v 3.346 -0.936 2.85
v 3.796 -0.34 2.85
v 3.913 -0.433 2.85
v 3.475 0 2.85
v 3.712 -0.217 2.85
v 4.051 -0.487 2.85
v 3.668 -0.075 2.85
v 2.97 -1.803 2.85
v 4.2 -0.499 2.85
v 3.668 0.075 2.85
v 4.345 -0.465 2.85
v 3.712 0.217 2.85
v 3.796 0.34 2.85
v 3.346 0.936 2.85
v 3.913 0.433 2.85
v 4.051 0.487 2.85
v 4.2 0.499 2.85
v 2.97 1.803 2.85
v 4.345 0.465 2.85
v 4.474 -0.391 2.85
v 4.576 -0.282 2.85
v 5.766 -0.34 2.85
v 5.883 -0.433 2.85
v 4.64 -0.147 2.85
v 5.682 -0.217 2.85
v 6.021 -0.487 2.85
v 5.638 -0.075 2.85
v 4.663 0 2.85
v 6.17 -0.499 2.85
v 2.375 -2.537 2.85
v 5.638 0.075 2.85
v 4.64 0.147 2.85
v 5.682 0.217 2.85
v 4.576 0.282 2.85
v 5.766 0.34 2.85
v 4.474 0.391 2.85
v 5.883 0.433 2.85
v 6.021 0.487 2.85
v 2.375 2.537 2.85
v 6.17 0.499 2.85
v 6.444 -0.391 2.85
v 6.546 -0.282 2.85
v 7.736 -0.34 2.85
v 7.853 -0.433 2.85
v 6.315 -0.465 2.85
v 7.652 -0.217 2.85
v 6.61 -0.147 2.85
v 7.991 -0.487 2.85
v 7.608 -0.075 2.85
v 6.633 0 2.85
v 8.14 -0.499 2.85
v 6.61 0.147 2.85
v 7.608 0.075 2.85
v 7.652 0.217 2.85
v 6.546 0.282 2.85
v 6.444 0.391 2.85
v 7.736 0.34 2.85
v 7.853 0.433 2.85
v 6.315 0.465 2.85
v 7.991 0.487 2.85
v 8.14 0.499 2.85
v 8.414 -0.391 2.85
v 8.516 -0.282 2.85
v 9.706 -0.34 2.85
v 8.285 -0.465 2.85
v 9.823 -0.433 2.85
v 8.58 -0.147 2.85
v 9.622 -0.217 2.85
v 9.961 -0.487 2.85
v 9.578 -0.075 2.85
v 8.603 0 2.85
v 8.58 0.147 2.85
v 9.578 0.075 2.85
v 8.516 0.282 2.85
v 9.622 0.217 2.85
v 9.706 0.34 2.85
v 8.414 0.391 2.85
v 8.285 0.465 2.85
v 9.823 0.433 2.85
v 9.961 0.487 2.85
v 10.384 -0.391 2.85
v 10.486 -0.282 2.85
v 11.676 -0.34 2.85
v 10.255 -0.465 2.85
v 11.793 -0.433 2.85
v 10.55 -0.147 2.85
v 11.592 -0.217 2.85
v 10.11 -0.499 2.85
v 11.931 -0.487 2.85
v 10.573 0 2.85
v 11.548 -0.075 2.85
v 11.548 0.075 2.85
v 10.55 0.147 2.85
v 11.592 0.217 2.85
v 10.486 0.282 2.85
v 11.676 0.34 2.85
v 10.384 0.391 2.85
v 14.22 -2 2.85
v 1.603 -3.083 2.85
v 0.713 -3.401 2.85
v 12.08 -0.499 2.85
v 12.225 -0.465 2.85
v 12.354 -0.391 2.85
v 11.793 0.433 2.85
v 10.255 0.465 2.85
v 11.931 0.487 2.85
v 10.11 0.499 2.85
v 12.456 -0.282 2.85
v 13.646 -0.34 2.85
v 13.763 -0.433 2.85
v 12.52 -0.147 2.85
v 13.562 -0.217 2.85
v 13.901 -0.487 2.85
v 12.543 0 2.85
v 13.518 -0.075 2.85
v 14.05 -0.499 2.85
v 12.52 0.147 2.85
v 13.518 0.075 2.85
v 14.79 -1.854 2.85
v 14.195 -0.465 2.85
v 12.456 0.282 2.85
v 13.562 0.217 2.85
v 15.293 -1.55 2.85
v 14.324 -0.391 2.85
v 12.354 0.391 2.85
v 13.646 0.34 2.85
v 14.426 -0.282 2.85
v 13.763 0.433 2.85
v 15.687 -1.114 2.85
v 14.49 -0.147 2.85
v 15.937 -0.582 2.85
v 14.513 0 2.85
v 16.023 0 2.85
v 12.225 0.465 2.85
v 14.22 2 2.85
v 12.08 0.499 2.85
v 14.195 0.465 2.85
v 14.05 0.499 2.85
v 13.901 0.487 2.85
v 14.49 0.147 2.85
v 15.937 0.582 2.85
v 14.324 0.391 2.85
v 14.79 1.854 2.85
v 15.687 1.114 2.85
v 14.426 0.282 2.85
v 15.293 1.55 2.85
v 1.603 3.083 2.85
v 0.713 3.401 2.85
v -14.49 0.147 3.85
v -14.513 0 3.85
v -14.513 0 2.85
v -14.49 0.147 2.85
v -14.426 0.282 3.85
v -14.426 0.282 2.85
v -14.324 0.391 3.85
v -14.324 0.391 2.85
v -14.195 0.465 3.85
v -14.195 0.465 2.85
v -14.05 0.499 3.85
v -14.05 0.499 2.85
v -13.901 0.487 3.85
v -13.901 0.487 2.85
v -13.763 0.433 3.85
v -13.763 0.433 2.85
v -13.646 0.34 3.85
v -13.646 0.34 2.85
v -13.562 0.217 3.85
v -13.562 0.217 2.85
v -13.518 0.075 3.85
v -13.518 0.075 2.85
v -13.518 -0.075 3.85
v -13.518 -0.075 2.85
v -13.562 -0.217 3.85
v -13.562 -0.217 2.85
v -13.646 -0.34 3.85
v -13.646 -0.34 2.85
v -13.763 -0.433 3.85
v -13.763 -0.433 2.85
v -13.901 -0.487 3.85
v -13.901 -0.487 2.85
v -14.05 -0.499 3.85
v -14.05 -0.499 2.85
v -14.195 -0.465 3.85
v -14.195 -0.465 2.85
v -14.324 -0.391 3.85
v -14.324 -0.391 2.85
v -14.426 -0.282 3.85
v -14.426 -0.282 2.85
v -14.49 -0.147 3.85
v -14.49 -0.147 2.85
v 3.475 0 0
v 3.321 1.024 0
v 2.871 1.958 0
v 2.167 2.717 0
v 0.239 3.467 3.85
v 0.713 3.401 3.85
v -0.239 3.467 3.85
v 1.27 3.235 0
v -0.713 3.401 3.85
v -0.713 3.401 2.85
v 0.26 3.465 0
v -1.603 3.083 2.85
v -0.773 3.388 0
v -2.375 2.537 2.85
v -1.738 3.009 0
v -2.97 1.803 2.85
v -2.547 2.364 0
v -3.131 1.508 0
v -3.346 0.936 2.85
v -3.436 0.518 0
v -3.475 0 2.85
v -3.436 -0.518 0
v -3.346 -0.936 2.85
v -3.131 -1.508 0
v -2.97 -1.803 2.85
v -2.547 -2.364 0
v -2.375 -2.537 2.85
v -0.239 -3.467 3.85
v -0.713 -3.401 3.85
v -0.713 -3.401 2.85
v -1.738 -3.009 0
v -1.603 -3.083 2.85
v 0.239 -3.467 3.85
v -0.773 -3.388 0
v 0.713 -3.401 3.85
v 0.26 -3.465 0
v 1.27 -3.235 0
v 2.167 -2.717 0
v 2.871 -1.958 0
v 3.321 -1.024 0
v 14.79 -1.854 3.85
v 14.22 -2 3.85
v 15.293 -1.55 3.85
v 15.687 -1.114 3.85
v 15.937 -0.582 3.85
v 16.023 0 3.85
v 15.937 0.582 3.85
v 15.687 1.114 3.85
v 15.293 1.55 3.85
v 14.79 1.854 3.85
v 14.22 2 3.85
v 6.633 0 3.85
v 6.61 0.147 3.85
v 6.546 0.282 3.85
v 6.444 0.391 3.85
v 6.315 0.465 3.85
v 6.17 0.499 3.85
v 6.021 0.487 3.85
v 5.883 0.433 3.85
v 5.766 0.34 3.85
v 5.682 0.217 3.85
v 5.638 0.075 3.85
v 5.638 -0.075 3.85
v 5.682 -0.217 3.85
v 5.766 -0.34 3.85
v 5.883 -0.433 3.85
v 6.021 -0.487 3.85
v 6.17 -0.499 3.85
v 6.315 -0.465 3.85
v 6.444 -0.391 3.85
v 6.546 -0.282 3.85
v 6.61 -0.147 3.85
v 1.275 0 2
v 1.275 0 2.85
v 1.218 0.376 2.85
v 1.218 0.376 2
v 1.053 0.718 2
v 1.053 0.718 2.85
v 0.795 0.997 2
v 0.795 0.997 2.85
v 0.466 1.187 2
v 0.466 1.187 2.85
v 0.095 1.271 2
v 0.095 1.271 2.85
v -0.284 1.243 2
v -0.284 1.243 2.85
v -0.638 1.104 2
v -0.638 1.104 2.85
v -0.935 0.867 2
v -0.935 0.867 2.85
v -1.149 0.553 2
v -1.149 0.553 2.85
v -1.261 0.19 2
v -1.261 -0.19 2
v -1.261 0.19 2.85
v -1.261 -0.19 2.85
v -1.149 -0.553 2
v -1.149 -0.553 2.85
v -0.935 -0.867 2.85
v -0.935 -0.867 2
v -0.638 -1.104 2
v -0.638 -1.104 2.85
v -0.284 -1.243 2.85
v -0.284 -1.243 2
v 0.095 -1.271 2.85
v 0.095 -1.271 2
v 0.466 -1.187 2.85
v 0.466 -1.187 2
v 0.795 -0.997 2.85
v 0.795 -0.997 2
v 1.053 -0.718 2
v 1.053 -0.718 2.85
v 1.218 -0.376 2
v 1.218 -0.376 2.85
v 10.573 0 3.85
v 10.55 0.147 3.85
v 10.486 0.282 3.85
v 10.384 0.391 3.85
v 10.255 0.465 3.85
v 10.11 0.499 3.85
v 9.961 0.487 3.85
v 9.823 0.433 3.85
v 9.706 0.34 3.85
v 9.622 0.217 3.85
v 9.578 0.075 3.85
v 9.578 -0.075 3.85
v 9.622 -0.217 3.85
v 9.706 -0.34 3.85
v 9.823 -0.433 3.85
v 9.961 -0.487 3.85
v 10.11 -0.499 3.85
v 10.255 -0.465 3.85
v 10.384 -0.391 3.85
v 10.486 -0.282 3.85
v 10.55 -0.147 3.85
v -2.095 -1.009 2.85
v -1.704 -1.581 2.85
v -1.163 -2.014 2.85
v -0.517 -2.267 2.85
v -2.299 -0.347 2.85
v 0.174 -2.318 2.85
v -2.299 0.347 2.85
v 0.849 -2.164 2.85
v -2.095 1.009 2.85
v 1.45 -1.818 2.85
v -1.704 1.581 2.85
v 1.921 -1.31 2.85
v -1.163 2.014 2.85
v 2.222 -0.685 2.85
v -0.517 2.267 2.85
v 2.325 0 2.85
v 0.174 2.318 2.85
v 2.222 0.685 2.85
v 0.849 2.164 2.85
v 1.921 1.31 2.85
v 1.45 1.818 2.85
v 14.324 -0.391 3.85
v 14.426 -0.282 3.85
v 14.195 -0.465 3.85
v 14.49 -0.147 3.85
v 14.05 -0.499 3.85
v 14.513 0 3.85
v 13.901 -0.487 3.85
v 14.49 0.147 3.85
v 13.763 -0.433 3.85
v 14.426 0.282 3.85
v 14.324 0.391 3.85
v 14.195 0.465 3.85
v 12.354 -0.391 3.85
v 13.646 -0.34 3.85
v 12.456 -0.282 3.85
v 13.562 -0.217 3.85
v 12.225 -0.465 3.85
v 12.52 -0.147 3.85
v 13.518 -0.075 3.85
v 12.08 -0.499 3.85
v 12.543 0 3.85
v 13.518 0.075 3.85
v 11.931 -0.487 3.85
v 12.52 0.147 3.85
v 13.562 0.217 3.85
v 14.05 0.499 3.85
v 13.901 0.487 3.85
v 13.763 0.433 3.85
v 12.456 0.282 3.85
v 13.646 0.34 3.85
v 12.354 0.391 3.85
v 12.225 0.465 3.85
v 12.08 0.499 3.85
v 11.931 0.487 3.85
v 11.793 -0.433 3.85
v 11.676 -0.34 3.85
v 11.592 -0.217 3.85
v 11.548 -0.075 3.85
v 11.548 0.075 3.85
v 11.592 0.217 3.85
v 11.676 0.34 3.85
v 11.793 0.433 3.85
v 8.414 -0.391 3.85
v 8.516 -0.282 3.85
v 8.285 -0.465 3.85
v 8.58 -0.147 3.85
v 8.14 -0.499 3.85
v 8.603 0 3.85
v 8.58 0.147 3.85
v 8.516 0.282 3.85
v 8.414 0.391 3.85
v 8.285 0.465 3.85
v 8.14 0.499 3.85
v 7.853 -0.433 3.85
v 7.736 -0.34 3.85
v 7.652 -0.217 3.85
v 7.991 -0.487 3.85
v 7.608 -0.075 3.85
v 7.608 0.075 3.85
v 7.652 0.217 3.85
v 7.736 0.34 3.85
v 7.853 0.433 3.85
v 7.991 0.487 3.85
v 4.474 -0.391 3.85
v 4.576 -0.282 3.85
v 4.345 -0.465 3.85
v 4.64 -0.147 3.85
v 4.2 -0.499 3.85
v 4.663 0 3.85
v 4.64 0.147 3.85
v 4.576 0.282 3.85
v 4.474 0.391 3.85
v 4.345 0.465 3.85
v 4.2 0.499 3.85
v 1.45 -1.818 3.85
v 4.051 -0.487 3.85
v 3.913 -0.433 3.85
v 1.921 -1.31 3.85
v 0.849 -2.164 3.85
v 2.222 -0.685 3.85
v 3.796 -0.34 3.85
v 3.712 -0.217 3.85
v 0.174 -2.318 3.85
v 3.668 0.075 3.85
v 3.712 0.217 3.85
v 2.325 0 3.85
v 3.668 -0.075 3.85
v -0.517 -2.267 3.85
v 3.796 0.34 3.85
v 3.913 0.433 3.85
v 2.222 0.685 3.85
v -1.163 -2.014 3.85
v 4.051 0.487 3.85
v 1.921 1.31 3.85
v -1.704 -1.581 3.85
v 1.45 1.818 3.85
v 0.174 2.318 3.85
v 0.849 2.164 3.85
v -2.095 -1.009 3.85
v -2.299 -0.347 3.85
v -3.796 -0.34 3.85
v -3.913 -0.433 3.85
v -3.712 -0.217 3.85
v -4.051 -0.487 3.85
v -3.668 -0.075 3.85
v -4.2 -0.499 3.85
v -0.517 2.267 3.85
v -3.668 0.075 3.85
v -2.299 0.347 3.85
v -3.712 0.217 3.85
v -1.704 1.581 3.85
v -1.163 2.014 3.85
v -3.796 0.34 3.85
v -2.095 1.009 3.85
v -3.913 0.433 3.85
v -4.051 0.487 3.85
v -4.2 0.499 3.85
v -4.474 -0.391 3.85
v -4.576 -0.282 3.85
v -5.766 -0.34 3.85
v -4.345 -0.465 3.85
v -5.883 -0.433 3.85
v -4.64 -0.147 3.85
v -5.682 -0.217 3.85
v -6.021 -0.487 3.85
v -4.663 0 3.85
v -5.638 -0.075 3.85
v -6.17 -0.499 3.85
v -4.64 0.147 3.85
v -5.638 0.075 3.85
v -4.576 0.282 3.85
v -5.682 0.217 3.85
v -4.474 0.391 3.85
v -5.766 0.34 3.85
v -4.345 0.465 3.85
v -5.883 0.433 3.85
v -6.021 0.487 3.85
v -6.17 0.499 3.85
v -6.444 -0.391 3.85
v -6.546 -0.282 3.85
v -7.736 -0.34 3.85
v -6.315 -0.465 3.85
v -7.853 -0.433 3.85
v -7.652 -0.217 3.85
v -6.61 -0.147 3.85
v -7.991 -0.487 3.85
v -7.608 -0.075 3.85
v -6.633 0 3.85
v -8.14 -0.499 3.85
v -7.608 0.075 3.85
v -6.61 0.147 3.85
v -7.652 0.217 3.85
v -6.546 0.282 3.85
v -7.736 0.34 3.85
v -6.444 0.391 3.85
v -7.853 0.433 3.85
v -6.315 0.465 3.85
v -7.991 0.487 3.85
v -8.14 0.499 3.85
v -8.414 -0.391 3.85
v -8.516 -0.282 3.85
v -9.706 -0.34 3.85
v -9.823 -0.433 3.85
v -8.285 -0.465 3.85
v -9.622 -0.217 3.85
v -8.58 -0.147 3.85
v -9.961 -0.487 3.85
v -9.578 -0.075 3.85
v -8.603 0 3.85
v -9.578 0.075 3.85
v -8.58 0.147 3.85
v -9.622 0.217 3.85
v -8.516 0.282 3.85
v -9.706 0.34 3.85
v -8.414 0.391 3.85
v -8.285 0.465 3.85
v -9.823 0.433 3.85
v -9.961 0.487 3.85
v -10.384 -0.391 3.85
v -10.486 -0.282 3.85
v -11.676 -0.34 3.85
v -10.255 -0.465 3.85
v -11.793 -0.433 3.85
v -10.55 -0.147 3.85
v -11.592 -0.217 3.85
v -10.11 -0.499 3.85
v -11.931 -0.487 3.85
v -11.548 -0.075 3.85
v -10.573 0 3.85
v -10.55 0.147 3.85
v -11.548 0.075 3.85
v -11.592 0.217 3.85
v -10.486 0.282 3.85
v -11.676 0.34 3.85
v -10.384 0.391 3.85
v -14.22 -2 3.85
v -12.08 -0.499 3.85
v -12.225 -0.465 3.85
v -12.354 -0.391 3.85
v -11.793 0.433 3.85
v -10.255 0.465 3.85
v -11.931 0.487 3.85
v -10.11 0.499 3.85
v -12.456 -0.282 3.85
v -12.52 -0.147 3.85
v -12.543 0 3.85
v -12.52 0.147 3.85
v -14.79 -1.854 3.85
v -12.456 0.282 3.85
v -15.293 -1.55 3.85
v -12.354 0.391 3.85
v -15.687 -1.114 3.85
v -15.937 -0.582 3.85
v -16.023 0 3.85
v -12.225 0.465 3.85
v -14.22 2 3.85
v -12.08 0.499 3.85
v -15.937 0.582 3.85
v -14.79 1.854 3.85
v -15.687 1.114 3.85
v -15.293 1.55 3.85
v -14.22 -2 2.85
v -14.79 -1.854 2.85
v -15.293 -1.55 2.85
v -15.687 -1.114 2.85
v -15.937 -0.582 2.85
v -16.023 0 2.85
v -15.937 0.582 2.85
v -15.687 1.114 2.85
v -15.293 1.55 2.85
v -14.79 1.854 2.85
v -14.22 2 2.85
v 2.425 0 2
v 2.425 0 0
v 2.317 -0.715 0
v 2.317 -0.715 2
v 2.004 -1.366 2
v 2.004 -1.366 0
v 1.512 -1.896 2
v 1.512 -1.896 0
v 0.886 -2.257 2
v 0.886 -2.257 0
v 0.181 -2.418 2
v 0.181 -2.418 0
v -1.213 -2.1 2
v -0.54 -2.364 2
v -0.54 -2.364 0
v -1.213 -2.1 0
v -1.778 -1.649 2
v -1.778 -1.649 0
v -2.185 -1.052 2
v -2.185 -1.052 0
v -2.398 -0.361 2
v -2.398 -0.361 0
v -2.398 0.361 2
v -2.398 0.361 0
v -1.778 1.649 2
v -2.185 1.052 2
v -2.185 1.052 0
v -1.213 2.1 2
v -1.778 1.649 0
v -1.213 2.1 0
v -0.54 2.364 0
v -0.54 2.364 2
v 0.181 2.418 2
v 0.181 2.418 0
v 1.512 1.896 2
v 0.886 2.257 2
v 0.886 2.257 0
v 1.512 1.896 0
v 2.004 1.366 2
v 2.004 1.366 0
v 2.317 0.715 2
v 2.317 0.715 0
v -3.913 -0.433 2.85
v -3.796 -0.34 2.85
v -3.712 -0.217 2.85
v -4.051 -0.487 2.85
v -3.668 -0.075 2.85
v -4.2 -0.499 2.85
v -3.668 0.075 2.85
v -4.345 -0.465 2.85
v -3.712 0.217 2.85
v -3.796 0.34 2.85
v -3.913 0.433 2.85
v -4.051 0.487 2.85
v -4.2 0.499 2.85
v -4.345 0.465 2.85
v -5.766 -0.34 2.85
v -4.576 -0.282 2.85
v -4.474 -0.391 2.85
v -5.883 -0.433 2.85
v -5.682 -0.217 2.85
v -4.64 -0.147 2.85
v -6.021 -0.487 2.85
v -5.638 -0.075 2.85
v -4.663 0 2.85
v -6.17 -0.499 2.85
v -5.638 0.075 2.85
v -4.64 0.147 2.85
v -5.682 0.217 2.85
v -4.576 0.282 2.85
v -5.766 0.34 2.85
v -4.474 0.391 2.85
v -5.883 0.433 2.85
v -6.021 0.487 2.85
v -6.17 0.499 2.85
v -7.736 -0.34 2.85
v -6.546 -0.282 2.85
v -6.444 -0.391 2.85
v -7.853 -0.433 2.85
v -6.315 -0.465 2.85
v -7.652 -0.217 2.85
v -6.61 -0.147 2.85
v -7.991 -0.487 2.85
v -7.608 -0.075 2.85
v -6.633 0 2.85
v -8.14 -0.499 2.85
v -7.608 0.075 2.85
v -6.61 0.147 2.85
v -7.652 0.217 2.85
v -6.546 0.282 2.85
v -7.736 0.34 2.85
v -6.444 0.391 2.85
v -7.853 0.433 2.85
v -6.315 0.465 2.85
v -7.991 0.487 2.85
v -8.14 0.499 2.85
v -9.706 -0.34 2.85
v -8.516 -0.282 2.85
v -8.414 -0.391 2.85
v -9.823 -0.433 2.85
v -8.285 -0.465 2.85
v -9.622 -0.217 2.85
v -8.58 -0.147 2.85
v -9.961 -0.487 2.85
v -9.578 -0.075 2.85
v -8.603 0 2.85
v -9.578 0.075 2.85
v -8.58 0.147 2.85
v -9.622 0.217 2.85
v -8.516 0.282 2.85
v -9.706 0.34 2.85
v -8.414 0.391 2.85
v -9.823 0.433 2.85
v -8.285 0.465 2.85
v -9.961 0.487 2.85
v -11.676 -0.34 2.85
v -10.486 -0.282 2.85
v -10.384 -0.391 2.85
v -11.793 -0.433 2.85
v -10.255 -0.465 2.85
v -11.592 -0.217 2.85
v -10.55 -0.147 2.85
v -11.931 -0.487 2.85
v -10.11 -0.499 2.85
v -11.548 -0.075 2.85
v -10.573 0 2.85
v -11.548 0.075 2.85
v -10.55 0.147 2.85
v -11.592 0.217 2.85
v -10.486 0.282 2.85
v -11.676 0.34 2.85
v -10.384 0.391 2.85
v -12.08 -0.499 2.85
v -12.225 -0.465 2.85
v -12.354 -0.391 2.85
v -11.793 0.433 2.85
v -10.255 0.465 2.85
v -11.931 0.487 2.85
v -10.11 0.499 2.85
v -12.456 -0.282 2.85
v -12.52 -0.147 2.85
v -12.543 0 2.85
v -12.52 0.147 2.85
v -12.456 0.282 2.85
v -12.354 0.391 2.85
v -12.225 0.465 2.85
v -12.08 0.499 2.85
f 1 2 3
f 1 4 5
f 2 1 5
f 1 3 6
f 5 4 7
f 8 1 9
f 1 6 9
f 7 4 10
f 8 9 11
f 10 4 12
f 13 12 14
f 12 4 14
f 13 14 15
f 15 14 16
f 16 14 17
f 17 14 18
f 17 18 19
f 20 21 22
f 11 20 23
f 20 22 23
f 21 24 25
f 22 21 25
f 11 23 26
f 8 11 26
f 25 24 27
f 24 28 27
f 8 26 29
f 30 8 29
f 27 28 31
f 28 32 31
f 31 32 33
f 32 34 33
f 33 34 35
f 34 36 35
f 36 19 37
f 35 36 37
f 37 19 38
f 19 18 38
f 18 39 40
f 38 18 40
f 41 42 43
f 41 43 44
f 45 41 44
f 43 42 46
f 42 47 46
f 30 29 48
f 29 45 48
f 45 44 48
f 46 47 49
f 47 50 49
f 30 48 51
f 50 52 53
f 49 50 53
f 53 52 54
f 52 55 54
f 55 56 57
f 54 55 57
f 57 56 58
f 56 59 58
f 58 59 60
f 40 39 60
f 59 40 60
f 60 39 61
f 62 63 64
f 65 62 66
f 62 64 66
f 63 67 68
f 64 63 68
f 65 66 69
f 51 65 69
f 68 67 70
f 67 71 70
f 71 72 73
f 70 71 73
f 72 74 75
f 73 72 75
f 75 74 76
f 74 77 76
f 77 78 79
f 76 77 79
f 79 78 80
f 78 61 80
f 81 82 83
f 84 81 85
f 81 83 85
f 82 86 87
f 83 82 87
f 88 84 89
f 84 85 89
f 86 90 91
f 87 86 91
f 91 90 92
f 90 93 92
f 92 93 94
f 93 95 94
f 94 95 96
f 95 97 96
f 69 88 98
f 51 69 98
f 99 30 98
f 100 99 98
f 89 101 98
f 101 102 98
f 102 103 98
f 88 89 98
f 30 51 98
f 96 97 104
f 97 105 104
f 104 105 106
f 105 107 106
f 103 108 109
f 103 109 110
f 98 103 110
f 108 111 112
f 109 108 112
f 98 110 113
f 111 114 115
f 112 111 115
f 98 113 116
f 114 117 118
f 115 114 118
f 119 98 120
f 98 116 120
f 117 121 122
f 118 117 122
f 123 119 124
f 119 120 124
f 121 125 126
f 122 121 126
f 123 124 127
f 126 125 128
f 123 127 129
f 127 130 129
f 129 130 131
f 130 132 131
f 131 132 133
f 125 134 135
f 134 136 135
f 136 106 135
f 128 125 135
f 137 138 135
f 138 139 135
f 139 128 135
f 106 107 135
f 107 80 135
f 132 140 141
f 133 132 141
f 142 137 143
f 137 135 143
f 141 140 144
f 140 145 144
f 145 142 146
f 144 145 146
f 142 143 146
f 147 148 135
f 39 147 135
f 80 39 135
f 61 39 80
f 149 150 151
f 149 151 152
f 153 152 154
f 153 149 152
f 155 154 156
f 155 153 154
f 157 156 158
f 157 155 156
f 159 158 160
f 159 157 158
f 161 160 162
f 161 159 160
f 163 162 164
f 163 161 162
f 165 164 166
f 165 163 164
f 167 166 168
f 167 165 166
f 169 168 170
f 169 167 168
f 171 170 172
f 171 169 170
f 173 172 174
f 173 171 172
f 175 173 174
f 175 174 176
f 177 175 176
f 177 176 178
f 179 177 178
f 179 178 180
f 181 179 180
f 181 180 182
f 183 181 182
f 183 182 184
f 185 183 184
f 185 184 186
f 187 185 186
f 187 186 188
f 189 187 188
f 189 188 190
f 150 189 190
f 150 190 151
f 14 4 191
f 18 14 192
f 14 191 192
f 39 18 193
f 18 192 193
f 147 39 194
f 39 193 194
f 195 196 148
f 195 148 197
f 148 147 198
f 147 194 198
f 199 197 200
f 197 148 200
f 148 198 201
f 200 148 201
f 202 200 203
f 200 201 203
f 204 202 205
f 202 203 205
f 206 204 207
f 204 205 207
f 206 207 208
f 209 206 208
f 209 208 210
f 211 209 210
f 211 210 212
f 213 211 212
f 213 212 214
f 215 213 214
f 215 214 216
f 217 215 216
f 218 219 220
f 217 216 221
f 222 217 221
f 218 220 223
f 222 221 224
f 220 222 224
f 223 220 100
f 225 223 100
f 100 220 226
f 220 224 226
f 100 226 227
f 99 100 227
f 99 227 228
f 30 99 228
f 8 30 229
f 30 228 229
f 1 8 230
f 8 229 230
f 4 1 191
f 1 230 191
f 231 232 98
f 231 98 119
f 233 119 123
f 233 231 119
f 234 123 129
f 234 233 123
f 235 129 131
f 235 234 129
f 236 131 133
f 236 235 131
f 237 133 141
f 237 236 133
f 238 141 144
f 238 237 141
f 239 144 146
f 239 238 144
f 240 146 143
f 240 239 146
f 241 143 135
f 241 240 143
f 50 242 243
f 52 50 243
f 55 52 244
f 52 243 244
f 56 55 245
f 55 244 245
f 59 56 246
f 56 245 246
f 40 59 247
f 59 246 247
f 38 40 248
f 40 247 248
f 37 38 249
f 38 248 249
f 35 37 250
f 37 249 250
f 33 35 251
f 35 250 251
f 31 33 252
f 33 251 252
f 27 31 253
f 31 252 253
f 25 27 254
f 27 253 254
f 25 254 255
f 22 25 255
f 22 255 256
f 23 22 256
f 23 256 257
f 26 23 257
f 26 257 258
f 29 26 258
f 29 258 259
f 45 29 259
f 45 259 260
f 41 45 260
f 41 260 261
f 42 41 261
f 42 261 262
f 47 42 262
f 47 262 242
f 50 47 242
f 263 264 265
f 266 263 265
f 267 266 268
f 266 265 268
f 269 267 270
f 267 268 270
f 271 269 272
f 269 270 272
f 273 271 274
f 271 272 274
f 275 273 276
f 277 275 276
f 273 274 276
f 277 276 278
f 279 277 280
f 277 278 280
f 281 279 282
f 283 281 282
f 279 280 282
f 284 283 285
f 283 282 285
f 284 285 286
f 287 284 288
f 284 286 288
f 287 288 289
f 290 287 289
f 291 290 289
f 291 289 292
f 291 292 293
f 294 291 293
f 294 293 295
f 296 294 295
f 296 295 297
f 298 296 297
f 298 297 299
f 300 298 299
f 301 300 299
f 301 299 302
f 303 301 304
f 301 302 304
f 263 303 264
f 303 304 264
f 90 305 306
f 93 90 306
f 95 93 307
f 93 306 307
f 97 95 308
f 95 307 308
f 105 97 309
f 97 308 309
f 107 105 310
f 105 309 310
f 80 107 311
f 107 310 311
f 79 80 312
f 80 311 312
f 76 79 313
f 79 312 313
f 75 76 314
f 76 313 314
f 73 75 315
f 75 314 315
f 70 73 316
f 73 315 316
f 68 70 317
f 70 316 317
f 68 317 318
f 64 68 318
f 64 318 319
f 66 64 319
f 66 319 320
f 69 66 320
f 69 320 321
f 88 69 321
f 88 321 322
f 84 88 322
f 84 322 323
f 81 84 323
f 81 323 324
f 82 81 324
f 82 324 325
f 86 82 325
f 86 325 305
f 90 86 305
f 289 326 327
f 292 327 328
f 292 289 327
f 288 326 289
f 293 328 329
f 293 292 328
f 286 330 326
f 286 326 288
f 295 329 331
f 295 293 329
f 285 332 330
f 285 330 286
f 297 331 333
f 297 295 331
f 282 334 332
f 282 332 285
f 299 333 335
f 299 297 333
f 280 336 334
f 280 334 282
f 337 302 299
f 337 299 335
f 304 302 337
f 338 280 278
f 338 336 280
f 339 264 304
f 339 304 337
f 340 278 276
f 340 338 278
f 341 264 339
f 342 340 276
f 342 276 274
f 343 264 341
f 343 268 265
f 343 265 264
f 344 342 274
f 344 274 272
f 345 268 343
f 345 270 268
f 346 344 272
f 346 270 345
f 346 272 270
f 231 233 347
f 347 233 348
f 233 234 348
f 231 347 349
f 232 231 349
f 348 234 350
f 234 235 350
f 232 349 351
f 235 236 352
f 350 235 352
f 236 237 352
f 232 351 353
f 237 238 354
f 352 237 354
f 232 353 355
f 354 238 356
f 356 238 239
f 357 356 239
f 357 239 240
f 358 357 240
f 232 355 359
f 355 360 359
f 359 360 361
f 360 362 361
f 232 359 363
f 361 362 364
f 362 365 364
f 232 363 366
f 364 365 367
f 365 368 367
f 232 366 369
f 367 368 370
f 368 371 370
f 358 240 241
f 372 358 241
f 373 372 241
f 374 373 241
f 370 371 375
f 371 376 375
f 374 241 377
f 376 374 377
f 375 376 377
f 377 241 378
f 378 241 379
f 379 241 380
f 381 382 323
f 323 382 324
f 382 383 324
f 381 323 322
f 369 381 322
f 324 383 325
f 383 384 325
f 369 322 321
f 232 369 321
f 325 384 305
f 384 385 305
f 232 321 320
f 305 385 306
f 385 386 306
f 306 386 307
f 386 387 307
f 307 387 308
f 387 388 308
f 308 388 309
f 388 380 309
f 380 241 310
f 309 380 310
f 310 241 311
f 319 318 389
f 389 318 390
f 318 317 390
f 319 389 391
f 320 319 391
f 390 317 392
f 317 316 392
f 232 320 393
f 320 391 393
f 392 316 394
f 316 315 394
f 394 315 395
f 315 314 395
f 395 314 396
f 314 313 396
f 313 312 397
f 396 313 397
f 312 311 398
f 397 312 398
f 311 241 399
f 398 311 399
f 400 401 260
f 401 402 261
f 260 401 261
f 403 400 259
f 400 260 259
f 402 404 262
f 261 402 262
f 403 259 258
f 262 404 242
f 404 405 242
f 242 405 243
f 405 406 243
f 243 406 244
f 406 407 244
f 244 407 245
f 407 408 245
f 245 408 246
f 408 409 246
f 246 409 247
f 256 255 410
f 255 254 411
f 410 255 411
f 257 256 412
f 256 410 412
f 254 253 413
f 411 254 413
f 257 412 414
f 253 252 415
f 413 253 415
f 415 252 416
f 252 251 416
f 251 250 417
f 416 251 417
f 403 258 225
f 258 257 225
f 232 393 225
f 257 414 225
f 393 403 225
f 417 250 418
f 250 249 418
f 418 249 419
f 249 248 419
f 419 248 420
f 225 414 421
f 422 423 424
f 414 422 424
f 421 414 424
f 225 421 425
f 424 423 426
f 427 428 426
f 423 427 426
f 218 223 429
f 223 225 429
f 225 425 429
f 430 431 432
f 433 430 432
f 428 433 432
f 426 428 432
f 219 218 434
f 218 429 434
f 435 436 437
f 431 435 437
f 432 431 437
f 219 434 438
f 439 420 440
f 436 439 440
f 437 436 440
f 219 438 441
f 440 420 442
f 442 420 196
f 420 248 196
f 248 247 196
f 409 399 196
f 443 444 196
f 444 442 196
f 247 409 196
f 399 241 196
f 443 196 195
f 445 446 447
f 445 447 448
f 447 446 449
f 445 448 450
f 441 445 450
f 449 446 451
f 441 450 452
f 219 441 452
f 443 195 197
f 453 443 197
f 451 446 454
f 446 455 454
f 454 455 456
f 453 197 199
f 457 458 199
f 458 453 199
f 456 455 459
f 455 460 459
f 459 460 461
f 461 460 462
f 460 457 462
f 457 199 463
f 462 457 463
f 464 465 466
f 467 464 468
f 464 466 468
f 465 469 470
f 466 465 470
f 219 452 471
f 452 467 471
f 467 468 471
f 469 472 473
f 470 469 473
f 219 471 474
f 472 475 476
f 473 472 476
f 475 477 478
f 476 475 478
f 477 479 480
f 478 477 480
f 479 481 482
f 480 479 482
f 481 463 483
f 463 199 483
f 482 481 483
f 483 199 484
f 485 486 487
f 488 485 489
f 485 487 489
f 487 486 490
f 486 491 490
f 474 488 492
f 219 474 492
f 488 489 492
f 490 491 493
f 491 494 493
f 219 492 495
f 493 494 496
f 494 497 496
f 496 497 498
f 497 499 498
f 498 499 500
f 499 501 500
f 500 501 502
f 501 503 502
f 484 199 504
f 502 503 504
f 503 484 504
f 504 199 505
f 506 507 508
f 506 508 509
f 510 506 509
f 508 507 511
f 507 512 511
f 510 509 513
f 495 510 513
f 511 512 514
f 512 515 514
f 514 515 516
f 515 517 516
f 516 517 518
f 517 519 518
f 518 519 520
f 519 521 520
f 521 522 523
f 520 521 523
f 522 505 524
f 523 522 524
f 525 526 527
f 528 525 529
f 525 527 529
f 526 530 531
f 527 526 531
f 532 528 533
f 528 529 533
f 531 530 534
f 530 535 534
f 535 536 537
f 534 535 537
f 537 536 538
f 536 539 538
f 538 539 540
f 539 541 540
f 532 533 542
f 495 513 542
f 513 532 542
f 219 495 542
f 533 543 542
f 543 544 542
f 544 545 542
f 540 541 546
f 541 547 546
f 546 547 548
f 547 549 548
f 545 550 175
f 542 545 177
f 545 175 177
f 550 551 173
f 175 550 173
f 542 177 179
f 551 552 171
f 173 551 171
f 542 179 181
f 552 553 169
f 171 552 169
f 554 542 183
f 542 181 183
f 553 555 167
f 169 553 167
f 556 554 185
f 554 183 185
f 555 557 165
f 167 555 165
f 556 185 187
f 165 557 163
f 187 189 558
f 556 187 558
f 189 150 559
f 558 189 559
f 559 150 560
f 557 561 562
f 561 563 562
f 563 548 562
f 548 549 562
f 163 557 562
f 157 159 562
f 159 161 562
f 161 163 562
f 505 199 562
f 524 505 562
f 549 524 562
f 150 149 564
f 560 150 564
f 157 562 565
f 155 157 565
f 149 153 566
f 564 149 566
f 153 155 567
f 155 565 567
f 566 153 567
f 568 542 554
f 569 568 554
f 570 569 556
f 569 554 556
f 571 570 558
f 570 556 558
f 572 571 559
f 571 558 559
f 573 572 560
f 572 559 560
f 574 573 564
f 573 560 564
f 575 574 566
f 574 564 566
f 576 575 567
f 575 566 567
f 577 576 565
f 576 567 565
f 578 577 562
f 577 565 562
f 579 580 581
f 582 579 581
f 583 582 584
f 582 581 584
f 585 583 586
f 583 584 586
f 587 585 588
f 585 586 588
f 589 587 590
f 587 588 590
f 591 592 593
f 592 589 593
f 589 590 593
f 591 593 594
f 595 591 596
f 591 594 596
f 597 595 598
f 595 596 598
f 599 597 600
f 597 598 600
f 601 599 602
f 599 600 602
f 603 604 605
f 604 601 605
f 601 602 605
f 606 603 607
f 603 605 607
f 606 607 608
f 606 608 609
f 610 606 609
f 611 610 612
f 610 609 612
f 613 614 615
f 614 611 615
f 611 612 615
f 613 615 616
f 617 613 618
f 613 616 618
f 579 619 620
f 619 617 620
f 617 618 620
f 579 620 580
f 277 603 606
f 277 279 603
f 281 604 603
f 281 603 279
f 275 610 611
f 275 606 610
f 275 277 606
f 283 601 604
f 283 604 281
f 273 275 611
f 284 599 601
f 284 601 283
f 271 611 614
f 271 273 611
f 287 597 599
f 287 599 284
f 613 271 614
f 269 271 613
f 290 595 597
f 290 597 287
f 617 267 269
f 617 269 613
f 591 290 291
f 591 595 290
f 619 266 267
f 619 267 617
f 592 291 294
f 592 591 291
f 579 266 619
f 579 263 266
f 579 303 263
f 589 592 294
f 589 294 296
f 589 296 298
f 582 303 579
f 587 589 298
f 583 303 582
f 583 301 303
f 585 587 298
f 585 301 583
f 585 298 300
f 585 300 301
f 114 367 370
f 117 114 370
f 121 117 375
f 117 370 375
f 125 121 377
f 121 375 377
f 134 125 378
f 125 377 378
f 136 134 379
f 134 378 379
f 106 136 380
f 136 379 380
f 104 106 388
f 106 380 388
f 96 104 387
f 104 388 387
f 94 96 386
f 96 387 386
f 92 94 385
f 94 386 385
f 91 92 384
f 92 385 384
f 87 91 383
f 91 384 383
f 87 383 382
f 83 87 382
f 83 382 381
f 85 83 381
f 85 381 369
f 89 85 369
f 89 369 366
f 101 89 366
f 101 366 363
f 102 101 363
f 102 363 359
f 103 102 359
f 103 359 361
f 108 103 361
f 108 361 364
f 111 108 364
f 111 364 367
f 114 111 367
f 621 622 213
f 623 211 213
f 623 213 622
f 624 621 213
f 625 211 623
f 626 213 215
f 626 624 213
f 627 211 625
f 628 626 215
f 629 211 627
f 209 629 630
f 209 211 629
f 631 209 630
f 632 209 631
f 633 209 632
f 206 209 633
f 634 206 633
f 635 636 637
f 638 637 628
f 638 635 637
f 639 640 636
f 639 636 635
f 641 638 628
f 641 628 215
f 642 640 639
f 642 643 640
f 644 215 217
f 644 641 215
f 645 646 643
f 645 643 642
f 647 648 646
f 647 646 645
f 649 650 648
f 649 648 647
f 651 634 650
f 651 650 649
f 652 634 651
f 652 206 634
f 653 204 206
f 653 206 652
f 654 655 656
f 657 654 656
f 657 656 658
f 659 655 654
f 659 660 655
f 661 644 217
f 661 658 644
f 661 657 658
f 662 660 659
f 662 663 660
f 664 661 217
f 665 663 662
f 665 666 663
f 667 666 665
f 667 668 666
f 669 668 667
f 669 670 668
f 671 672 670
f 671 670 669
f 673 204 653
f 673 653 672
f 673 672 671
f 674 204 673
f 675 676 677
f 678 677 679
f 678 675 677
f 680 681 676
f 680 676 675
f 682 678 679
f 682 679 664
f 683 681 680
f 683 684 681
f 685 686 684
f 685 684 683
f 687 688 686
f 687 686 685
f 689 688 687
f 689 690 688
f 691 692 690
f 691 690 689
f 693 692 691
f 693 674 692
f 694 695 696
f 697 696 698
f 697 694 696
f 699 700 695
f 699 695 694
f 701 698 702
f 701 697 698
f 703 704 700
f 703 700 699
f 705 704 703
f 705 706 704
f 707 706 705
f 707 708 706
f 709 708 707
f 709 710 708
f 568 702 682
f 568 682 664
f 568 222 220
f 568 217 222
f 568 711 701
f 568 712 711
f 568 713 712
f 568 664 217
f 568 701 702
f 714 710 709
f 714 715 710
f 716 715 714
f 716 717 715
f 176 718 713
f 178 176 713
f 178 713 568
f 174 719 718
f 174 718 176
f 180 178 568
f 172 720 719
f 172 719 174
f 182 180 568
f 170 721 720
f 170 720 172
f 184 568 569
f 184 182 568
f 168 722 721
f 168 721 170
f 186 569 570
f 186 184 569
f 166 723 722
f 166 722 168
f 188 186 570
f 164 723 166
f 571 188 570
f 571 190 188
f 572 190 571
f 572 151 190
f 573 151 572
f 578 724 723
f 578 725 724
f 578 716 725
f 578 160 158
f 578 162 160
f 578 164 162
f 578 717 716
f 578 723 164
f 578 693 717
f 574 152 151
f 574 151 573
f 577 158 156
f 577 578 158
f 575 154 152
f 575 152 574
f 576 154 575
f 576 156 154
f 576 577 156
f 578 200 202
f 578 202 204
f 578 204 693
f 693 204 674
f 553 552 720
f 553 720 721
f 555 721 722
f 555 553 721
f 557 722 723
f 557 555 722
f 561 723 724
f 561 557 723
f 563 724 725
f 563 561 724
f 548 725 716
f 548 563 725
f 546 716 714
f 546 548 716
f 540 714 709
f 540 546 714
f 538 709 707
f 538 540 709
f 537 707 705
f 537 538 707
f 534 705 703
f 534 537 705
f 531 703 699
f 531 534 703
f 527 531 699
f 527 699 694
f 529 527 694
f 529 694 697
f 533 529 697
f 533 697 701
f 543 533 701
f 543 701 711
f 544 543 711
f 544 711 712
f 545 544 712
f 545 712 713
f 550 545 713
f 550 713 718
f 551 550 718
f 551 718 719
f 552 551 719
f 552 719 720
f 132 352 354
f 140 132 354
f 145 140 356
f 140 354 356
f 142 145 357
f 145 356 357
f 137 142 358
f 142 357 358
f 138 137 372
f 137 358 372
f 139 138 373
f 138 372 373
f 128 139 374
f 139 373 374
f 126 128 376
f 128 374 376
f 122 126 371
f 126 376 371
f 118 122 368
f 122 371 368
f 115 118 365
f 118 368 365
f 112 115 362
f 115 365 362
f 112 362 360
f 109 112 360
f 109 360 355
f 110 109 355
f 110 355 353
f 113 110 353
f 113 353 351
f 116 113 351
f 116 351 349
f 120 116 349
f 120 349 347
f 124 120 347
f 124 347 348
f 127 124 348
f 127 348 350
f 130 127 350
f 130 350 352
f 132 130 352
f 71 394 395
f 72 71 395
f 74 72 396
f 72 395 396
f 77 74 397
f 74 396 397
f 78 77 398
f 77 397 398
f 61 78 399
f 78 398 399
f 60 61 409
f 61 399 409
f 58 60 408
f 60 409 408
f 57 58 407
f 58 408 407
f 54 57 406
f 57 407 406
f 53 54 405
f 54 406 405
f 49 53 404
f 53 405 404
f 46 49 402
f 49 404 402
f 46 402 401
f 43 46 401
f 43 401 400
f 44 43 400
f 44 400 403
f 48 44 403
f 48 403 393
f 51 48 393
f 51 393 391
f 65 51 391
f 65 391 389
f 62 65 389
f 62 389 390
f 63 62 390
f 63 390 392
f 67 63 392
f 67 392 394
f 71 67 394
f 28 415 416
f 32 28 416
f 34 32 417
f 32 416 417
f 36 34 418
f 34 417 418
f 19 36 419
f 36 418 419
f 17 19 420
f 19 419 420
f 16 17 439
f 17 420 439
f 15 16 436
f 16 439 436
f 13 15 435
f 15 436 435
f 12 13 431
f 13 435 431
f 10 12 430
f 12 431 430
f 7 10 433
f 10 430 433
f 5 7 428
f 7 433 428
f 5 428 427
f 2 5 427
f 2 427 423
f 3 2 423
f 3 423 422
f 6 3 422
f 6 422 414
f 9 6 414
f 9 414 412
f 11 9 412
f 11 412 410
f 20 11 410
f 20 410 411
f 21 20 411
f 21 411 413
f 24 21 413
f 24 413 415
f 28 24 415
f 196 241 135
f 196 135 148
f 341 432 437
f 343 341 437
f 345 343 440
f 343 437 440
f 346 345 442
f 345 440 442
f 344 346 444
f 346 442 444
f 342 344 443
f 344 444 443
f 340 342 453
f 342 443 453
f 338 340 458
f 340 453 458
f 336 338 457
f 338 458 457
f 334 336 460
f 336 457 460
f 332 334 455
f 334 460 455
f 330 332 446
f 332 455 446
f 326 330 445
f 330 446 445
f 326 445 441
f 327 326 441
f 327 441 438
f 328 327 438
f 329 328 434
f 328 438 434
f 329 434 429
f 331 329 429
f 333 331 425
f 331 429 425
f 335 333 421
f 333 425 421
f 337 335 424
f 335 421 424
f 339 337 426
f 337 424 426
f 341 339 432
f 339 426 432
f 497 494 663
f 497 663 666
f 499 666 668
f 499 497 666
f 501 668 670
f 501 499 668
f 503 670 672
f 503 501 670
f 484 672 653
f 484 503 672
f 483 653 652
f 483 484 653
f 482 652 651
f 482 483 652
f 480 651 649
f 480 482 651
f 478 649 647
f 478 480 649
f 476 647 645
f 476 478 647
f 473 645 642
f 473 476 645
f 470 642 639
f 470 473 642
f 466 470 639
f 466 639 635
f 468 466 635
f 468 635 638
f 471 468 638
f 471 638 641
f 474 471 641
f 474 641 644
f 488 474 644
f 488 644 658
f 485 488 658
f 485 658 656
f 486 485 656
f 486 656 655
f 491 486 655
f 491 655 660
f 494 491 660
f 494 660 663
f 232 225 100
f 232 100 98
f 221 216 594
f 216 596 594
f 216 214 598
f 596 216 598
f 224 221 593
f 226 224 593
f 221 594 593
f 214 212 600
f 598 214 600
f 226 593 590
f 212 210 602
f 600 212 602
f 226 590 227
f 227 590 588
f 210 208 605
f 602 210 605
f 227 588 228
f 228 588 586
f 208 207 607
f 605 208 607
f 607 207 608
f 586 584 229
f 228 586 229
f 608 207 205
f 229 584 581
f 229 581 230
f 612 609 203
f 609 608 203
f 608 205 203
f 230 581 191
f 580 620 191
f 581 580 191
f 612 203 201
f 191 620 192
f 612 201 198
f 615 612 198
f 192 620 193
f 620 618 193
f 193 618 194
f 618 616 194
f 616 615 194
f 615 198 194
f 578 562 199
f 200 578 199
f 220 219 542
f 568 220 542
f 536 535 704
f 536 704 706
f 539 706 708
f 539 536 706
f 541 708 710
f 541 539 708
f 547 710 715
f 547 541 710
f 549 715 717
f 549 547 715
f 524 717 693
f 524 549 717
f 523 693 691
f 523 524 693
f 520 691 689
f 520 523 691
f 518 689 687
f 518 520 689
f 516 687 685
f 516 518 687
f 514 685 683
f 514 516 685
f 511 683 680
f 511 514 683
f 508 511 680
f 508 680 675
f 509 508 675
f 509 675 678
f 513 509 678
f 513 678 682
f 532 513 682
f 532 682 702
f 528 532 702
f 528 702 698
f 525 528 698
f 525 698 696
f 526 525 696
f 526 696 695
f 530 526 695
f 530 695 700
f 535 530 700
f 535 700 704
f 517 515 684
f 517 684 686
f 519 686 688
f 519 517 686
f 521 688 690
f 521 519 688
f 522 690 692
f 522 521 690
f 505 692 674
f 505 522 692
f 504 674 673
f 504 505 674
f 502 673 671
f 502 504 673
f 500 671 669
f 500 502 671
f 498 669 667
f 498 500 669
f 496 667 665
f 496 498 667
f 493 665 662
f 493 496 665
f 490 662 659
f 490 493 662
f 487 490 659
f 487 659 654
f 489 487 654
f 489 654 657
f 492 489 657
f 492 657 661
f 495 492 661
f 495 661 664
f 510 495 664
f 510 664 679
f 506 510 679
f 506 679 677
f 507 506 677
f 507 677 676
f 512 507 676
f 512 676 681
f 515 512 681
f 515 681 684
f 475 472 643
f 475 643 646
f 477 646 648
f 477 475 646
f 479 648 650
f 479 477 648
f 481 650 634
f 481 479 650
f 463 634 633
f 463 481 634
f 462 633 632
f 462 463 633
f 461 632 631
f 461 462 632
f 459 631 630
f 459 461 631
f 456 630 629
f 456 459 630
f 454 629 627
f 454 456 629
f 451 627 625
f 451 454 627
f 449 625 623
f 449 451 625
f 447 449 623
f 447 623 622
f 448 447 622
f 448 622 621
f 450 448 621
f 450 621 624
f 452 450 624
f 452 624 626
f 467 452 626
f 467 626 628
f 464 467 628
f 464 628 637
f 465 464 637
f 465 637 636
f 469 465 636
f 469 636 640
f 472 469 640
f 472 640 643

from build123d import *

# Parameters (mm, degrees)
F0_R      = 3.475
F1_DEPTH  = 3.85
F2_R      = 2.425
F3_DEPTH  = 2
F5_DEPTH  = 1
F6_R      = 2.325
F7_DEPTH  = 1
F8_R      = 1.275
F9_DEPTH  = 2.851
F10_R     = 0.5
F11_DEPTH = 3.851


with BuildPart() as f1:
    # F0 (on Top) → F1 (new body)
    with BuildSketch(Plane.XY):
        Circle(F0_R)
    extrude(amount=F1_DEPTH)

    # F2 (on face) → F3 (cut)
    with BuildSketch(Plane(origin=(0, 0, 0), x_dir=(1, 0, 0), z_dir=(0, 0, -1))):
        Circle(F2_R)
    extrude(amount=-F3_DEPTH, mode=Mode.SUBTRACT)

    # F4 (on face) → F5 (join)
    with BuildSketch(Plane.XY.offset(3.85)):
        with BuildLine():
            Line((14.22, 2), (0, 3.475))
            ThreePointArc((0, 3.475), (-3.475, 0), (0, -3.475))
            Line((0, -3.475), (14.22, -2))
            ThreePointArc((14.22, -2), (16.023276, 0), (14.22, 2))
        make_face()
    extrude(amount=-F5_DEPTH)

    # F6 (on face) → F7 (cut)
    with BuildSketch(Plane.XY.offset(3.85)):
        Circle(F6_R)
    extrude(amount=-F7_DEPTH, mode=Mode.SUBTRACT)

    # F8 (on face) → F9 (cut, through all)
    with BuildSketch(Plane.XY.offset(2.85)):
        Circle(F8_R)
    extrude(amount=-F9_DEPTH, mode=Mode.SUBTRACT)

    # F10 (on face) → F11 (cut, through all)
    with BuildSketch(Plane.XY.offset(3.85)):
        with Locations((14.012546, 0)):
            Circle(F10_R)
        with Locations((12.042546, 0)):
            Circle(F10_R)
        with Locations((10.072546, 0)):
            Circle(F10_R)
        with Locations((8.102546, 0)):
            Circle(F10_R)
        with Locations((6.132546, 0)):
            Circle(F10_R)
        with Locations((4.162546, 0)):
            Circle(F10_R)
    extrude(amount=-F11_DEPTH, mode=Mode.SUBTRACT)

    # F12: F1 across plane


with BuildPart() as f1_1:
    add(f1.part)
    add(f1.part.mirror(Plane.YZ))


solid = f1_1.part
